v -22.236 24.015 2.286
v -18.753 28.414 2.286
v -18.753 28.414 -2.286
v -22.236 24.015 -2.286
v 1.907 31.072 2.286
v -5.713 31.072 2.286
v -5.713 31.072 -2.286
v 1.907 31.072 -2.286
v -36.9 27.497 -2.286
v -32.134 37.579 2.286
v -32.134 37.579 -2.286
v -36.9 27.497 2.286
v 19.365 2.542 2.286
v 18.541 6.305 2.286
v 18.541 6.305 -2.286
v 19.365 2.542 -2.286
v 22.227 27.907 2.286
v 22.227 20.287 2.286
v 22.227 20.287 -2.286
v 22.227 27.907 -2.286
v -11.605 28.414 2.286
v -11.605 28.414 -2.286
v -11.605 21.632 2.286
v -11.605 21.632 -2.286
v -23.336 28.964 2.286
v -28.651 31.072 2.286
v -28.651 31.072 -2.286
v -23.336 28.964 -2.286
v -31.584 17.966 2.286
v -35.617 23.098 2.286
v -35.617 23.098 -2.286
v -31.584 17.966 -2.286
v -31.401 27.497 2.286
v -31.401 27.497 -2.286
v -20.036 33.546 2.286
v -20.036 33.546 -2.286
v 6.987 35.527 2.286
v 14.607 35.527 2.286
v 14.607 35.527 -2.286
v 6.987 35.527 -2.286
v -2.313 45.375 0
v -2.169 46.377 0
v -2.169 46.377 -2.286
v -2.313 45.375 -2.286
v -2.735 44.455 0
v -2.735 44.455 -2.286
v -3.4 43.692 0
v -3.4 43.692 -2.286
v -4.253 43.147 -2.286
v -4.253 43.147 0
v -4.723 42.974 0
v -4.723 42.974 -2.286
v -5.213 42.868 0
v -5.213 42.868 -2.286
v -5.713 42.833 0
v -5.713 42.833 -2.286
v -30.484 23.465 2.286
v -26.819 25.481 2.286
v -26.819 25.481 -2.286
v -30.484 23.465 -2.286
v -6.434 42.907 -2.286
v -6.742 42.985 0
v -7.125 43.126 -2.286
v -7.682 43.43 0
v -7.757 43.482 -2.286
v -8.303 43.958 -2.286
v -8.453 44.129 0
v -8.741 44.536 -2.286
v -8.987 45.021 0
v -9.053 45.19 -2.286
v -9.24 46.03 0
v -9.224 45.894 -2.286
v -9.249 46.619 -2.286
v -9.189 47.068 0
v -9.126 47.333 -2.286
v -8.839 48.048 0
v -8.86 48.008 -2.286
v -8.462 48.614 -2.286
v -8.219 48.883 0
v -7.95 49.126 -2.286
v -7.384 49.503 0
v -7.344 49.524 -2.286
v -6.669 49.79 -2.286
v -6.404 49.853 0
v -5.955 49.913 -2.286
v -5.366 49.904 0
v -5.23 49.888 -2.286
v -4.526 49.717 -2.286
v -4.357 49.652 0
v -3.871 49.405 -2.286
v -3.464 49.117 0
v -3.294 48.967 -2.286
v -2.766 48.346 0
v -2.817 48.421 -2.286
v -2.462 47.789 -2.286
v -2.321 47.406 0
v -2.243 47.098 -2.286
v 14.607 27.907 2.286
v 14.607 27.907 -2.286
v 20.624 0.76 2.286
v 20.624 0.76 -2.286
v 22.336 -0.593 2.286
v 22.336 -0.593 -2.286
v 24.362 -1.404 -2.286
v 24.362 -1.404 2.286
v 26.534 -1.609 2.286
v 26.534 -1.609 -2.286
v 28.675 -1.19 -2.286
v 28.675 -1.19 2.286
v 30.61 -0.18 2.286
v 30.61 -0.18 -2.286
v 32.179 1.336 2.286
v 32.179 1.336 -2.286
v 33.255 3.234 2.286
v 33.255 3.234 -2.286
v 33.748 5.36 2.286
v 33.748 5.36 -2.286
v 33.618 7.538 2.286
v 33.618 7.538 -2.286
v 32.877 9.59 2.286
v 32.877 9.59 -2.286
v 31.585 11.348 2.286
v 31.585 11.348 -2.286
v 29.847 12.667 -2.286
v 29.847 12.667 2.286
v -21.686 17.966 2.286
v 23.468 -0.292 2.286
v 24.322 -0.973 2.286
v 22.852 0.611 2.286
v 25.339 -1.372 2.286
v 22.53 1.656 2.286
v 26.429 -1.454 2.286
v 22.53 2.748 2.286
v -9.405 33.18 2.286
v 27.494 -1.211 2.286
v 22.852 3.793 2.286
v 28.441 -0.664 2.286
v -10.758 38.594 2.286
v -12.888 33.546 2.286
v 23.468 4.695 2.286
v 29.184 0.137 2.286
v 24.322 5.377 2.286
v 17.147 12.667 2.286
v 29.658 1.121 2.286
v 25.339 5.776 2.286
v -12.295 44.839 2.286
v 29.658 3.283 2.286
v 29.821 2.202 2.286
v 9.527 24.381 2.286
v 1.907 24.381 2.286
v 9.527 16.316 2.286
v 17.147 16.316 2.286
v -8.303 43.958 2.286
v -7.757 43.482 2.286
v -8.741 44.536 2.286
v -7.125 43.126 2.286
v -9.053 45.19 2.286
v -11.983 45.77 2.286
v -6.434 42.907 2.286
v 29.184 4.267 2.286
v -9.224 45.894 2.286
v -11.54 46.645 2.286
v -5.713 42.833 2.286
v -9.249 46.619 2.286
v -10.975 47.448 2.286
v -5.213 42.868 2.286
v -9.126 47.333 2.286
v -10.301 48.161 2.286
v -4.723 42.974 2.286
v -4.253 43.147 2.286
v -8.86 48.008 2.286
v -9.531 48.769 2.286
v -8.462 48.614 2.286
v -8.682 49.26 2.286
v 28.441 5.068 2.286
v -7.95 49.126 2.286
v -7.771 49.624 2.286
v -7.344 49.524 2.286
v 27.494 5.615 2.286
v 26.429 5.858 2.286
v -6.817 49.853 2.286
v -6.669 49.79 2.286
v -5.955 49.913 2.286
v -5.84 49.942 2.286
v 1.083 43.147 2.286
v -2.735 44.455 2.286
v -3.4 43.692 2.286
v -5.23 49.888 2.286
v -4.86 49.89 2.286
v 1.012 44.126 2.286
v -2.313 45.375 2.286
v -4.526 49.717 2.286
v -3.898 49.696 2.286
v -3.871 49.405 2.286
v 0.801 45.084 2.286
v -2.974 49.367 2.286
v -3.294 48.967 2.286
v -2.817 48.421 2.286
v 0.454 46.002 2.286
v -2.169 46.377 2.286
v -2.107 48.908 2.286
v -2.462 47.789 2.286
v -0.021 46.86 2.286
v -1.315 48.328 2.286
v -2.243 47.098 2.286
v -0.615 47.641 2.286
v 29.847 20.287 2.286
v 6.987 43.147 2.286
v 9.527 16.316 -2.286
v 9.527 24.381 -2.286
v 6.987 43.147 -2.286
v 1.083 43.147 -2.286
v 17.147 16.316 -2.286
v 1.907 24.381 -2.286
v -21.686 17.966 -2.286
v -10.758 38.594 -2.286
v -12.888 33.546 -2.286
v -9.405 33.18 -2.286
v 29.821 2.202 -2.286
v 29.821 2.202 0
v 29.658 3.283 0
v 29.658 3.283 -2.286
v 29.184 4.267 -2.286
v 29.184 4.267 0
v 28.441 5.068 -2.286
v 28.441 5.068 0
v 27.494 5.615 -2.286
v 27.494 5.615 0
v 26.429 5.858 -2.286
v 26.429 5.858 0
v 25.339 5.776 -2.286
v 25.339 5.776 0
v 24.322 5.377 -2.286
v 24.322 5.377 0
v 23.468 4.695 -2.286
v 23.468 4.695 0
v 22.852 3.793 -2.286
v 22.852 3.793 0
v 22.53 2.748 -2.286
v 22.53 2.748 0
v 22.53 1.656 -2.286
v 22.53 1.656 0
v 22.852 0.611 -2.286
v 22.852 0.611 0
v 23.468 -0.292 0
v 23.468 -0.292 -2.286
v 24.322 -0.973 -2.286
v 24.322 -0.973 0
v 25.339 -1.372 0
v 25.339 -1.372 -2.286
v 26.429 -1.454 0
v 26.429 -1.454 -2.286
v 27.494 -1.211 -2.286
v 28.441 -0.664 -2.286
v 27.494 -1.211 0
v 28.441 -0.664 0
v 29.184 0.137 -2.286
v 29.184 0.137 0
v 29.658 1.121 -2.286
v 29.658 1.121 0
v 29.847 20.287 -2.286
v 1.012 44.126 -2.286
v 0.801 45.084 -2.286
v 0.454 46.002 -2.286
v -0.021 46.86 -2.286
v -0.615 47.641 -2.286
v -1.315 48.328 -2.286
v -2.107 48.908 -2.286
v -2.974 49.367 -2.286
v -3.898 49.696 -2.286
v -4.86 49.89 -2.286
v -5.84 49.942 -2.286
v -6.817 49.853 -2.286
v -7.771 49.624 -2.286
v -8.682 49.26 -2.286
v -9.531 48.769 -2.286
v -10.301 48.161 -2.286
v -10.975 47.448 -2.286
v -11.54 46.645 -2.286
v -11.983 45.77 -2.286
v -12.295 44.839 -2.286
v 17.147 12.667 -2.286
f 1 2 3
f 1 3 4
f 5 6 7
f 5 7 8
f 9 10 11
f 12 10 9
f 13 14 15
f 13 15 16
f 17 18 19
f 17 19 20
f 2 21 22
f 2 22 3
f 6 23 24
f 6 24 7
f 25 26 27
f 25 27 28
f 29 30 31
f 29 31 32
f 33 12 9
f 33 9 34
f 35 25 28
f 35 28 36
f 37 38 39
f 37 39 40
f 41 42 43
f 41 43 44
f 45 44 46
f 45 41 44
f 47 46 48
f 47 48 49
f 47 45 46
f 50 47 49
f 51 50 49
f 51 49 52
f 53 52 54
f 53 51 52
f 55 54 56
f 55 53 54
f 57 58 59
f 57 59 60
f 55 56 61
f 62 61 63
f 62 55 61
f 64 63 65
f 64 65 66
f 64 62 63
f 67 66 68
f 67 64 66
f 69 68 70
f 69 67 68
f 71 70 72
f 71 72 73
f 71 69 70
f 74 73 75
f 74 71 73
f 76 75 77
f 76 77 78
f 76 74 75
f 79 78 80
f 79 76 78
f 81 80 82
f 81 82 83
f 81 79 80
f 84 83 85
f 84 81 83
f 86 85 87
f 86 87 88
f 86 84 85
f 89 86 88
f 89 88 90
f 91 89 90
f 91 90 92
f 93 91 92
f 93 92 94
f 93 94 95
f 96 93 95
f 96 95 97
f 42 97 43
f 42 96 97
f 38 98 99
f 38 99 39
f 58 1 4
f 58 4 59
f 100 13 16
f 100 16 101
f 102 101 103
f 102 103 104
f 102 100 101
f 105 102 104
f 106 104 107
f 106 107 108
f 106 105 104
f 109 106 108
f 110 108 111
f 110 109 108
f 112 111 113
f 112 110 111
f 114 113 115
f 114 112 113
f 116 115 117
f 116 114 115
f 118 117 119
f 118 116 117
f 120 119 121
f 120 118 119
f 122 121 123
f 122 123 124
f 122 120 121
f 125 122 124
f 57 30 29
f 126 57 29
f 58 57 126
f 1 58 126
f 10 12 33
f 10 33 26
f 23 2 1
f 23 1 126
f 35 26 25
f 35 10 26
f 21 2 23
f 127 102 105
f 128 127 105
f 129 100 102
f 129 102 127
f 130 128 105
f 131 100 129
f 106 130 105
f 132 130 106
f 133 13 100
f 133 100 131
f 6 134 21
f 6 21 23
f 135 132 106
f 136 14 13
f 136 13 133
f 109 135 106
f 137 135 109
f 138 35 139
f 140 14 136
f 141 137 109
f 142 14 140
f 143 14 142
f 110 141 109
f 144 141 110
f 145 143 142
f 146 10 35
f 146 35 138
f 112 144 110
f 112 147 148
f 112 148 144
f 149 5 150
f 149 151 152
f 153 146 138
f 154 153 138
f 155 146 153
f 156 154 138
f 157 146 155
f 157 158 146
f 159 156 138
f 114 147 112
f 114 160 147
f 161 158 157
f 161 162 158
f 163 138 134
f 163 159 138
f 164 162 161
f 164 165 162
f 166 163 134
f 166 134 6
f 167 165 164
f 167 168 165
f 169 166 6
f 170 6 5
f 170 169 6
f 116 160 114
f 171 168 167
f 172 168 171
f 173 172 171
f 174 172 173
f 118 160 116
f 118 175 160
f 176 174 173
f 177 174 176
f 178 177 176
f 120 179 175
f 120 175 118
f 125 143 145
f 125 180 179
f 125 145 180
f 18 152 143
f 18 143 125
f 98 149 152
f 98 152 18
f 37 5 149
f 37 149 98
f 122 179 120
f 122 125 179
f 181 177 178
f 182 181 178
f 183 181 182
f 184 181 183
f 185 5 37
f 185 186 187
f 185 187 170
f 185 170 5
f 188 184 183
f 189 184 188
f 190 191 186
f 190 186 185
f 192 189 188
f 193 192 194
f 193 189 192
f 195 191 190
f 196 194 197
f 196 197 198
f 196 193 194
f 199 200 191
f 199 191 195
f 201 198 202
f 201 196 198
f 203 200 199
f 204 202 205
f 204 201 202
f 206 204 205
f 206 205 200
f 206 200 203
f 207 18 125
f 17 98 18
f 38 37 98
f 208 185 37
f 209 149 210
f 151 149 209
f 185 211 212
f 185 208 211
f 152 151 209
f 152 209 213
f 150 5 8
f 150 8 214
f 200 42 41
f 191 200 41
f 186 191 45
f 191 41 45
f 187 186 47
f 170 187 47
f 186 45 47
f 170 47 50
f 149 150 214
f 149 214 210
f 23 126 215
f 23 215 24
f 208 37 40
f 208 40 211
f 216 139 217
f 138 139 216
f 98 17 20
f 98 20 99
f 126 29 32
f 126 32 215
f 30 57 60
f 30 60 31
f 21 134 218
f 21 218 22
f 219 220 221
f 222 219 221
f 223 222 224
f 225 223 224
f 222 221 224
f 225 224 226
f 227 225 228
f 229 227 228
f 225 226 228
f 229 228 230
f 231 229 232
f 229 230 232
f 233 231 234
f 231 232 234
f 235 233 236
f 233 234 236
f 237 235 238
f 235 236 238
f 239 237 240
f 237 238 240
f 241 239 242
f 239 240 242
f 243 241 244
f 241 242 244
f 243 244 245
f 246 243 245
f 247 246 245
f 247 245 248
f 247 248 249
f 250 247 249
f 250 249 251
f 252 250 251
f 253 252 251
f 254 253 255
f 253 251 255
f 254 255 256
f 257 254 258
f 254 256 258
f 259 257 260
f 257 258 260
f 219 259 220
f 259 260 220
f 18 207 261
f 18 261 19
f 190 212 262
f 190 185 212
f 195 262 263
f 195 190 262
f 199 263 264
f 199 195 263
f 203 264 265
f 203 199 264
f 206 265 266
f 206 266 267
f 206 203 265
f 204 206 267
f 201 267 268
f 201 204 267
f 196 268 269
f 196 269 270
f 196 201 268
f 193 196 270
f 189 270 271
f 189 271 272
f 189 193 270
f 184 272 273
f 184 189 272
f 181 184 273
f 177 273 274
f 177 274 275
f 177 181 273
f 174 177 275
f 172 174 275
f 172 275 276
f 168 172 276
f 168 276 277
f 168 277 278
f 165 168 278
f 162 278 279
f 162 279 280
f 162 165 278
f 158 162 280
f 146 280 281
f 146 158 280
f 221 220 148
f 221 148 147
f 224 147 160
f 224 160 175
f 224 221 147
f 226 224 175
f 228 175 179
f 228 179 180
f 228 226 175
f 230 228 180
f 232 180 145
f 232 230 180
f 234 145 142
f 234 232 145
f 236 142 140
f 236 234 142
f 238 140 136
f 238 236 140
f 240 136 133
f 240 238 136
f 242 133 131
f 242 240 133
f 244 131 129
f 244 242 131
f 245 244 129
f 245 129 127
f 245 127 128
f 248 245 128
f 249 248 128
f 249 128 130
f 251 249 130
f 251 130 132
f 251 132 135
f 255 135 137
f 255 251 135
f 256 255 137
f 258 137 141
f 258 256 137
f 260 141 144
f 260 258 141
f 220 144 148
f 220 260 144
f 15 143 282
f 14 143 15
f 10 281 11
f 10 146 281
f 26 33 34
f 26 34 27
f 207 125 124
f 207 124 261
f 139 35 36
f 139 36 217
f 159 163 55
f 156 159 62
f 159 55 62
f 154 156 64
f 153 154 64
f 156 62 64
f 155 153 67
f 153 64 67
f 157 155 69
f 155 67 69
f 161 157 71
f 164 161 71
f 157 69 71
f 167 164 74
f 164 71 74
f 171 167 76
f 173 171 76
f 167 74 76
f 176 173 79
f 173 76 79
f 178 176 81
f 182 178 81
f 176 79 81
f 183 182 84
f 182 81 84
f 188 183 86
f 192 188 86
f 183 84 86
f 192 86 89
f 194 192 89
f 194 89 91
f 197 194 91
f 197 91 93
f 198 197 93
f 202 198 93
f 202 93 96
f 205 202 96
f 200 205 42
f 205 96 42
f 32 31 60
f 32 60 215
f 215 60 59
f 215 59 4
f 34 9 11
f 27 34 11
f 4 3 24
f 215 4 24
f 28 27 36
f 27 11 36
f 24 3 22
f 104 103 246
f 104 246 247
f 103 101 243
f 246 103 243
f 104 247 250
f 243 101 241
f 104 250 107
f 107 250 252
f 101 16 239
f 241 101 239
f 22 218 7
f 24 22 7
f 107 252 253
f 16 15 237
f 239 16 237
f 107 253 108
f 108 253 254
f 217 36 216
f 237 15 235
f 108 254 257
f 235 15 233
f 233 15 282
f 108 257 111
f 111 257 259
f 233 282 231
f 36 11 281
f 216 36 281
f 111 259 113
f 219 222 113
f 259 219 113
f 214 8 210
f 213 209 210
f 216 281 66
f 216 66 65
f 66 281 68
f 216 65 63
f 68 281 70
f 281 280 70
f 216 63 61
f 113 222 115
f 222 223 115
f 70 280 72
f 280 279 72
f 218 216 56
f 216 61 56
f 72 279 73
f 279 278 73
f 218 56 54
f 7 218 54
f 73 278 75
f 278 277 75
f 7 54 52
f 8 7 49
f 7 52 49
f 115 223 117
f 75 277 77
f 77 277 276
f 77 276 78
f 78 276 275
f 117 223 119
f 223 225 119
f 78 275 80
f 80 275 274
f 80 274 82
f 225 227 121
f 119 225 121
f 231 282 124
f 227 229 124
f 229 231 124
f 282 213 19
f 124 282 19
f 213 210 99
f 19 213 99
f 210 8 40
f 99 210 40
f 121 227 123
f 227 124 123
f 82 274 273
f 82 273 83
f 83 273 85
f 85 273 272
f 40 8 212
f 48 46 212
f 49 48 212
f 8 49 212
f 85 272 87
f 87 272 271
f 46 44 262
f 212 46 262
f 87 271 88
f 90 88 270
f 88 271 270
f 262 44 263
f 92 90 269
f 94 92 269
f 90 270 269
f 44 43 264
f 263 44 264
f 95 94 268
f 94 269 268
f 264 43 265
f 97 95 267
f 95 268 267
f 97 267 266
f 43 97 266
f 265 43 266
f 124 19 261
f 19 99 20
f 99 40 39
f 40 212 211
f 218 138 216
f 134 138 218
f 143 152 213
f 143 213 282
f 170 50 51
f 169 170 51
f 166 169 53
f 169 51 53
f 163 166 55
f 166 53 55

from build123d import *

# Parameters (mm, degrees)
F0_R          = 3.6659795791
F1_DEPTH      = 2.286
F1_DEPTH_BACK = 2.286


with BuildPart() as f1:
    # F0 (on Top) → F1 (new body, two sides)
    with BuildSketch(Plane.XY) as f1_sk:
        with BuildLine():
            ThreePointArc((-10.7581636849, 38.5943156396), (-12.3120194853, 41.5236119371), (-12.2948130254, 44.8394751105))
            Line((-12.2948130254, 44.8394751105), (-32.1341768742, 37.5786978342))
            Line((-32.1341768742, 37.5786978342), (-36.8999519289, 27.4972548299))
            Line((-36.8999519289, 27.4972548299), (-31.4009838641, 27.4972548299))
            Line((-31.4009838641, 27.4972548299), (-28.6514998317, 31.071584724))
            Line((-28.6514998317, 31.071584724), (-23.3358272255, 28.9636466709))
            Line((-23.3358272255, 28.9636466709), (-20.0364456416, 33.5461209119))
            Line((-20.0364456416, 33.5461209119), (-12.8877867848, 33.5461209119))
            Line((-12.8877867848, 33.5461209119), (-10.7581636849, 38.5943156396))
        make_face()
        with BuildLine():
            Line((-5.712940873, 31.071584724), (-5.712940873, 36.3514380628))
            ThreePointArc((-5.712940873, 36.3514380628), (-8.4735917494, 36.9374208909), (-10.7581636849, 38.5943156396))
            Line((-10.7581636849, 38.5943156396), (-9.405106017, 33.179522777))
            Line((-9.405106017, 33.179522777), (-11.6046943605, 28.413749585))
            Line((-11.6046943605, 28.413749585), (-18.7533550799, 28.413749585))
            Line((-18.7533550799, 28.413749585), (-22.2360358477, 24.0145740621))
            Line((-22.2360358477, 24.0145740621), (-26.8185079933, 25.4809661359))
            Line((-26.8185079933, 25.4809661359), (-30.4844879449, 23.4646779076))
            Line((-30.4844879449, 23.4646779076), (-35.6168613673, 23.0980795399))
            Line((-35.6168613673, 23.0980795399), (-31.584283048, 17.9657079802))
            Line((-31.584283048, 17.9657079802), (-21.6861382962, 17.9657079802))
            Line((-21.6861382962, 17.9657079802), (-11.6046943605, 21.6316870005))
            Line((-11.6046943605, 21.6316870005), (-5.712940873, 31.071584724))
        make_face()
        with BuildLine():
            Line((-4.2532354575, 43.1473446608), (1.0829657251, 43.1473446608))
            ThreePointArc((1.0829657251, 43.1473446608), (-4.8601343001, 49.8895303182), (-12.2948130254, 44.8394751105))
            ThreePointArc((-12.2948130254, 44.8394751105), (-12.3120194853, 41.5236119371), (-10.7581636849, 38.5943156396))
            ThreePointArc((-10.7581636849, 38.5943156396), (-8.4735917494, 36.9374208909), (-5.712940873, 36.3514380628))
            Line((-5.712940873, 36.3514380628), (-5.712940873, 42.832795892))
            ThreePointArc((-5.712940873, 42.832795892), (-8.219106195, 48.883214202), (-2.168687885, 46.3770488799))
            ThreePointArc((-2.168687885, 46.3770488799), (-2.7350813629, 44.4550494051), (-4.2532354575, 43.1473446608))
        make_face()
        with BuildLine():
            ThreePointArc((-5.712940873, 36.3514380628), (-0.9075092332, 38.341913021), (1.0829657251, 43.1473446608))
            Line((1.0829657251, 43.1473446608), (-4.2532354575, 43.1473446608))
            ThreePointArc((-4.2532354575, 43.1473446608), (-4.9663350821, 42.9123253649), (-5.712940873, 42.832795892))
            Line((-5.712940873, 42.832795892), (-5.712940873, 36.3514380628))
        make_face()
        with BuildLine():
            Line((6.987059127, 35.5273446608), (6.987059127, 43.1473446608))
            Line((6.987059127, 43.1473446608), (1.0829657251, 43.1473446608))
            ThreePointArc((1.0829657251, 43.1473446608), (-0.9075092332, 38.341913021), (-5.712940873, 36.3514380628))
            Line((-5.712940873, 36.3514380628), (-5.712940873, 31.071584724))
            Line((-5.712940873, 31.071584724), (1.907059127, 31.071584724))
            Line((1.907059127, 31.071584724), (1.907059127, 24.3811724298))
            Line((1.907059127, 24.3811724298), (9.527059127, 24.3811724298))
            Line((9.527059127, 24.3811724298), (9.527059127, 16.3160171882))
            Line((9.527059127, 16.3160171882), (17.147059127, 16.3160171882))
            Line((17.147059127, 16.3160171882), (17.147059127, 12.6673446608))
            Line((17.147059127, 12.6673446608), (22.4627302145, 12.6673446608))
            Line((22.4627302145, 12.6673446608), (29.847059127, 12.6673446608))
            Line((29.847059127, 12.6673446608), (29.847059127, 20.2873446608))
            Line((29.847059127, 20.2873446608), (22.227059127, 20.2873446608))
            Line((22.227059127, 20.2873446608), (22.227059127, 27.9073446608))
            Line((22.227059127, 27.9073446608), (14.607059127, 27.9073446608))
            Line((14.607059127, 27.9073446608), (14.607059127, 35.5273446608))
            Line((14.607059127, 35.5273446608), (6.987059127, 35.5273446608))
        make_face()
        with BuildLine():
            Line((29.847059127, 12.6673446608), (22.4627302145, 12.6673446608))
            ThreePointArc((22.4627302145, 12.6673446608), (19.6683145281, 10.0001717736), (18.54095211, 6.3053613295))
            Line((18.54095211, 6.3053613295), (19.3654773553, 2.5420768229))
            ThreePointArc((19.3654773553, 2.5420768229), (31.449090173, 0.5210860144), (29.847059127, 12.6673446608))
        make_face()
        with Locations((26.1548946708, 2.2019967959)):
            Circle(F0_R, mode=Mode.SUBTRACT)
        with BuildLine():
            Line((22.4627302145, 12.6673446608), (17.147059127, 12.6673446608))
            Line((17.147059127, 12.6673446608), (18.54095211, 6.3053613295))
            ThreePointArc((18.54095211, 6.3053613295), (19.6683145281, 10.0001717736), (22.4627302145, 12.6673446608))
        make_face()
    extrude(amount=F1_DEPTH)
    extrude(f1_sk.sketch, amount=-F1_DEPTH_BACK)


solid = f1.part
